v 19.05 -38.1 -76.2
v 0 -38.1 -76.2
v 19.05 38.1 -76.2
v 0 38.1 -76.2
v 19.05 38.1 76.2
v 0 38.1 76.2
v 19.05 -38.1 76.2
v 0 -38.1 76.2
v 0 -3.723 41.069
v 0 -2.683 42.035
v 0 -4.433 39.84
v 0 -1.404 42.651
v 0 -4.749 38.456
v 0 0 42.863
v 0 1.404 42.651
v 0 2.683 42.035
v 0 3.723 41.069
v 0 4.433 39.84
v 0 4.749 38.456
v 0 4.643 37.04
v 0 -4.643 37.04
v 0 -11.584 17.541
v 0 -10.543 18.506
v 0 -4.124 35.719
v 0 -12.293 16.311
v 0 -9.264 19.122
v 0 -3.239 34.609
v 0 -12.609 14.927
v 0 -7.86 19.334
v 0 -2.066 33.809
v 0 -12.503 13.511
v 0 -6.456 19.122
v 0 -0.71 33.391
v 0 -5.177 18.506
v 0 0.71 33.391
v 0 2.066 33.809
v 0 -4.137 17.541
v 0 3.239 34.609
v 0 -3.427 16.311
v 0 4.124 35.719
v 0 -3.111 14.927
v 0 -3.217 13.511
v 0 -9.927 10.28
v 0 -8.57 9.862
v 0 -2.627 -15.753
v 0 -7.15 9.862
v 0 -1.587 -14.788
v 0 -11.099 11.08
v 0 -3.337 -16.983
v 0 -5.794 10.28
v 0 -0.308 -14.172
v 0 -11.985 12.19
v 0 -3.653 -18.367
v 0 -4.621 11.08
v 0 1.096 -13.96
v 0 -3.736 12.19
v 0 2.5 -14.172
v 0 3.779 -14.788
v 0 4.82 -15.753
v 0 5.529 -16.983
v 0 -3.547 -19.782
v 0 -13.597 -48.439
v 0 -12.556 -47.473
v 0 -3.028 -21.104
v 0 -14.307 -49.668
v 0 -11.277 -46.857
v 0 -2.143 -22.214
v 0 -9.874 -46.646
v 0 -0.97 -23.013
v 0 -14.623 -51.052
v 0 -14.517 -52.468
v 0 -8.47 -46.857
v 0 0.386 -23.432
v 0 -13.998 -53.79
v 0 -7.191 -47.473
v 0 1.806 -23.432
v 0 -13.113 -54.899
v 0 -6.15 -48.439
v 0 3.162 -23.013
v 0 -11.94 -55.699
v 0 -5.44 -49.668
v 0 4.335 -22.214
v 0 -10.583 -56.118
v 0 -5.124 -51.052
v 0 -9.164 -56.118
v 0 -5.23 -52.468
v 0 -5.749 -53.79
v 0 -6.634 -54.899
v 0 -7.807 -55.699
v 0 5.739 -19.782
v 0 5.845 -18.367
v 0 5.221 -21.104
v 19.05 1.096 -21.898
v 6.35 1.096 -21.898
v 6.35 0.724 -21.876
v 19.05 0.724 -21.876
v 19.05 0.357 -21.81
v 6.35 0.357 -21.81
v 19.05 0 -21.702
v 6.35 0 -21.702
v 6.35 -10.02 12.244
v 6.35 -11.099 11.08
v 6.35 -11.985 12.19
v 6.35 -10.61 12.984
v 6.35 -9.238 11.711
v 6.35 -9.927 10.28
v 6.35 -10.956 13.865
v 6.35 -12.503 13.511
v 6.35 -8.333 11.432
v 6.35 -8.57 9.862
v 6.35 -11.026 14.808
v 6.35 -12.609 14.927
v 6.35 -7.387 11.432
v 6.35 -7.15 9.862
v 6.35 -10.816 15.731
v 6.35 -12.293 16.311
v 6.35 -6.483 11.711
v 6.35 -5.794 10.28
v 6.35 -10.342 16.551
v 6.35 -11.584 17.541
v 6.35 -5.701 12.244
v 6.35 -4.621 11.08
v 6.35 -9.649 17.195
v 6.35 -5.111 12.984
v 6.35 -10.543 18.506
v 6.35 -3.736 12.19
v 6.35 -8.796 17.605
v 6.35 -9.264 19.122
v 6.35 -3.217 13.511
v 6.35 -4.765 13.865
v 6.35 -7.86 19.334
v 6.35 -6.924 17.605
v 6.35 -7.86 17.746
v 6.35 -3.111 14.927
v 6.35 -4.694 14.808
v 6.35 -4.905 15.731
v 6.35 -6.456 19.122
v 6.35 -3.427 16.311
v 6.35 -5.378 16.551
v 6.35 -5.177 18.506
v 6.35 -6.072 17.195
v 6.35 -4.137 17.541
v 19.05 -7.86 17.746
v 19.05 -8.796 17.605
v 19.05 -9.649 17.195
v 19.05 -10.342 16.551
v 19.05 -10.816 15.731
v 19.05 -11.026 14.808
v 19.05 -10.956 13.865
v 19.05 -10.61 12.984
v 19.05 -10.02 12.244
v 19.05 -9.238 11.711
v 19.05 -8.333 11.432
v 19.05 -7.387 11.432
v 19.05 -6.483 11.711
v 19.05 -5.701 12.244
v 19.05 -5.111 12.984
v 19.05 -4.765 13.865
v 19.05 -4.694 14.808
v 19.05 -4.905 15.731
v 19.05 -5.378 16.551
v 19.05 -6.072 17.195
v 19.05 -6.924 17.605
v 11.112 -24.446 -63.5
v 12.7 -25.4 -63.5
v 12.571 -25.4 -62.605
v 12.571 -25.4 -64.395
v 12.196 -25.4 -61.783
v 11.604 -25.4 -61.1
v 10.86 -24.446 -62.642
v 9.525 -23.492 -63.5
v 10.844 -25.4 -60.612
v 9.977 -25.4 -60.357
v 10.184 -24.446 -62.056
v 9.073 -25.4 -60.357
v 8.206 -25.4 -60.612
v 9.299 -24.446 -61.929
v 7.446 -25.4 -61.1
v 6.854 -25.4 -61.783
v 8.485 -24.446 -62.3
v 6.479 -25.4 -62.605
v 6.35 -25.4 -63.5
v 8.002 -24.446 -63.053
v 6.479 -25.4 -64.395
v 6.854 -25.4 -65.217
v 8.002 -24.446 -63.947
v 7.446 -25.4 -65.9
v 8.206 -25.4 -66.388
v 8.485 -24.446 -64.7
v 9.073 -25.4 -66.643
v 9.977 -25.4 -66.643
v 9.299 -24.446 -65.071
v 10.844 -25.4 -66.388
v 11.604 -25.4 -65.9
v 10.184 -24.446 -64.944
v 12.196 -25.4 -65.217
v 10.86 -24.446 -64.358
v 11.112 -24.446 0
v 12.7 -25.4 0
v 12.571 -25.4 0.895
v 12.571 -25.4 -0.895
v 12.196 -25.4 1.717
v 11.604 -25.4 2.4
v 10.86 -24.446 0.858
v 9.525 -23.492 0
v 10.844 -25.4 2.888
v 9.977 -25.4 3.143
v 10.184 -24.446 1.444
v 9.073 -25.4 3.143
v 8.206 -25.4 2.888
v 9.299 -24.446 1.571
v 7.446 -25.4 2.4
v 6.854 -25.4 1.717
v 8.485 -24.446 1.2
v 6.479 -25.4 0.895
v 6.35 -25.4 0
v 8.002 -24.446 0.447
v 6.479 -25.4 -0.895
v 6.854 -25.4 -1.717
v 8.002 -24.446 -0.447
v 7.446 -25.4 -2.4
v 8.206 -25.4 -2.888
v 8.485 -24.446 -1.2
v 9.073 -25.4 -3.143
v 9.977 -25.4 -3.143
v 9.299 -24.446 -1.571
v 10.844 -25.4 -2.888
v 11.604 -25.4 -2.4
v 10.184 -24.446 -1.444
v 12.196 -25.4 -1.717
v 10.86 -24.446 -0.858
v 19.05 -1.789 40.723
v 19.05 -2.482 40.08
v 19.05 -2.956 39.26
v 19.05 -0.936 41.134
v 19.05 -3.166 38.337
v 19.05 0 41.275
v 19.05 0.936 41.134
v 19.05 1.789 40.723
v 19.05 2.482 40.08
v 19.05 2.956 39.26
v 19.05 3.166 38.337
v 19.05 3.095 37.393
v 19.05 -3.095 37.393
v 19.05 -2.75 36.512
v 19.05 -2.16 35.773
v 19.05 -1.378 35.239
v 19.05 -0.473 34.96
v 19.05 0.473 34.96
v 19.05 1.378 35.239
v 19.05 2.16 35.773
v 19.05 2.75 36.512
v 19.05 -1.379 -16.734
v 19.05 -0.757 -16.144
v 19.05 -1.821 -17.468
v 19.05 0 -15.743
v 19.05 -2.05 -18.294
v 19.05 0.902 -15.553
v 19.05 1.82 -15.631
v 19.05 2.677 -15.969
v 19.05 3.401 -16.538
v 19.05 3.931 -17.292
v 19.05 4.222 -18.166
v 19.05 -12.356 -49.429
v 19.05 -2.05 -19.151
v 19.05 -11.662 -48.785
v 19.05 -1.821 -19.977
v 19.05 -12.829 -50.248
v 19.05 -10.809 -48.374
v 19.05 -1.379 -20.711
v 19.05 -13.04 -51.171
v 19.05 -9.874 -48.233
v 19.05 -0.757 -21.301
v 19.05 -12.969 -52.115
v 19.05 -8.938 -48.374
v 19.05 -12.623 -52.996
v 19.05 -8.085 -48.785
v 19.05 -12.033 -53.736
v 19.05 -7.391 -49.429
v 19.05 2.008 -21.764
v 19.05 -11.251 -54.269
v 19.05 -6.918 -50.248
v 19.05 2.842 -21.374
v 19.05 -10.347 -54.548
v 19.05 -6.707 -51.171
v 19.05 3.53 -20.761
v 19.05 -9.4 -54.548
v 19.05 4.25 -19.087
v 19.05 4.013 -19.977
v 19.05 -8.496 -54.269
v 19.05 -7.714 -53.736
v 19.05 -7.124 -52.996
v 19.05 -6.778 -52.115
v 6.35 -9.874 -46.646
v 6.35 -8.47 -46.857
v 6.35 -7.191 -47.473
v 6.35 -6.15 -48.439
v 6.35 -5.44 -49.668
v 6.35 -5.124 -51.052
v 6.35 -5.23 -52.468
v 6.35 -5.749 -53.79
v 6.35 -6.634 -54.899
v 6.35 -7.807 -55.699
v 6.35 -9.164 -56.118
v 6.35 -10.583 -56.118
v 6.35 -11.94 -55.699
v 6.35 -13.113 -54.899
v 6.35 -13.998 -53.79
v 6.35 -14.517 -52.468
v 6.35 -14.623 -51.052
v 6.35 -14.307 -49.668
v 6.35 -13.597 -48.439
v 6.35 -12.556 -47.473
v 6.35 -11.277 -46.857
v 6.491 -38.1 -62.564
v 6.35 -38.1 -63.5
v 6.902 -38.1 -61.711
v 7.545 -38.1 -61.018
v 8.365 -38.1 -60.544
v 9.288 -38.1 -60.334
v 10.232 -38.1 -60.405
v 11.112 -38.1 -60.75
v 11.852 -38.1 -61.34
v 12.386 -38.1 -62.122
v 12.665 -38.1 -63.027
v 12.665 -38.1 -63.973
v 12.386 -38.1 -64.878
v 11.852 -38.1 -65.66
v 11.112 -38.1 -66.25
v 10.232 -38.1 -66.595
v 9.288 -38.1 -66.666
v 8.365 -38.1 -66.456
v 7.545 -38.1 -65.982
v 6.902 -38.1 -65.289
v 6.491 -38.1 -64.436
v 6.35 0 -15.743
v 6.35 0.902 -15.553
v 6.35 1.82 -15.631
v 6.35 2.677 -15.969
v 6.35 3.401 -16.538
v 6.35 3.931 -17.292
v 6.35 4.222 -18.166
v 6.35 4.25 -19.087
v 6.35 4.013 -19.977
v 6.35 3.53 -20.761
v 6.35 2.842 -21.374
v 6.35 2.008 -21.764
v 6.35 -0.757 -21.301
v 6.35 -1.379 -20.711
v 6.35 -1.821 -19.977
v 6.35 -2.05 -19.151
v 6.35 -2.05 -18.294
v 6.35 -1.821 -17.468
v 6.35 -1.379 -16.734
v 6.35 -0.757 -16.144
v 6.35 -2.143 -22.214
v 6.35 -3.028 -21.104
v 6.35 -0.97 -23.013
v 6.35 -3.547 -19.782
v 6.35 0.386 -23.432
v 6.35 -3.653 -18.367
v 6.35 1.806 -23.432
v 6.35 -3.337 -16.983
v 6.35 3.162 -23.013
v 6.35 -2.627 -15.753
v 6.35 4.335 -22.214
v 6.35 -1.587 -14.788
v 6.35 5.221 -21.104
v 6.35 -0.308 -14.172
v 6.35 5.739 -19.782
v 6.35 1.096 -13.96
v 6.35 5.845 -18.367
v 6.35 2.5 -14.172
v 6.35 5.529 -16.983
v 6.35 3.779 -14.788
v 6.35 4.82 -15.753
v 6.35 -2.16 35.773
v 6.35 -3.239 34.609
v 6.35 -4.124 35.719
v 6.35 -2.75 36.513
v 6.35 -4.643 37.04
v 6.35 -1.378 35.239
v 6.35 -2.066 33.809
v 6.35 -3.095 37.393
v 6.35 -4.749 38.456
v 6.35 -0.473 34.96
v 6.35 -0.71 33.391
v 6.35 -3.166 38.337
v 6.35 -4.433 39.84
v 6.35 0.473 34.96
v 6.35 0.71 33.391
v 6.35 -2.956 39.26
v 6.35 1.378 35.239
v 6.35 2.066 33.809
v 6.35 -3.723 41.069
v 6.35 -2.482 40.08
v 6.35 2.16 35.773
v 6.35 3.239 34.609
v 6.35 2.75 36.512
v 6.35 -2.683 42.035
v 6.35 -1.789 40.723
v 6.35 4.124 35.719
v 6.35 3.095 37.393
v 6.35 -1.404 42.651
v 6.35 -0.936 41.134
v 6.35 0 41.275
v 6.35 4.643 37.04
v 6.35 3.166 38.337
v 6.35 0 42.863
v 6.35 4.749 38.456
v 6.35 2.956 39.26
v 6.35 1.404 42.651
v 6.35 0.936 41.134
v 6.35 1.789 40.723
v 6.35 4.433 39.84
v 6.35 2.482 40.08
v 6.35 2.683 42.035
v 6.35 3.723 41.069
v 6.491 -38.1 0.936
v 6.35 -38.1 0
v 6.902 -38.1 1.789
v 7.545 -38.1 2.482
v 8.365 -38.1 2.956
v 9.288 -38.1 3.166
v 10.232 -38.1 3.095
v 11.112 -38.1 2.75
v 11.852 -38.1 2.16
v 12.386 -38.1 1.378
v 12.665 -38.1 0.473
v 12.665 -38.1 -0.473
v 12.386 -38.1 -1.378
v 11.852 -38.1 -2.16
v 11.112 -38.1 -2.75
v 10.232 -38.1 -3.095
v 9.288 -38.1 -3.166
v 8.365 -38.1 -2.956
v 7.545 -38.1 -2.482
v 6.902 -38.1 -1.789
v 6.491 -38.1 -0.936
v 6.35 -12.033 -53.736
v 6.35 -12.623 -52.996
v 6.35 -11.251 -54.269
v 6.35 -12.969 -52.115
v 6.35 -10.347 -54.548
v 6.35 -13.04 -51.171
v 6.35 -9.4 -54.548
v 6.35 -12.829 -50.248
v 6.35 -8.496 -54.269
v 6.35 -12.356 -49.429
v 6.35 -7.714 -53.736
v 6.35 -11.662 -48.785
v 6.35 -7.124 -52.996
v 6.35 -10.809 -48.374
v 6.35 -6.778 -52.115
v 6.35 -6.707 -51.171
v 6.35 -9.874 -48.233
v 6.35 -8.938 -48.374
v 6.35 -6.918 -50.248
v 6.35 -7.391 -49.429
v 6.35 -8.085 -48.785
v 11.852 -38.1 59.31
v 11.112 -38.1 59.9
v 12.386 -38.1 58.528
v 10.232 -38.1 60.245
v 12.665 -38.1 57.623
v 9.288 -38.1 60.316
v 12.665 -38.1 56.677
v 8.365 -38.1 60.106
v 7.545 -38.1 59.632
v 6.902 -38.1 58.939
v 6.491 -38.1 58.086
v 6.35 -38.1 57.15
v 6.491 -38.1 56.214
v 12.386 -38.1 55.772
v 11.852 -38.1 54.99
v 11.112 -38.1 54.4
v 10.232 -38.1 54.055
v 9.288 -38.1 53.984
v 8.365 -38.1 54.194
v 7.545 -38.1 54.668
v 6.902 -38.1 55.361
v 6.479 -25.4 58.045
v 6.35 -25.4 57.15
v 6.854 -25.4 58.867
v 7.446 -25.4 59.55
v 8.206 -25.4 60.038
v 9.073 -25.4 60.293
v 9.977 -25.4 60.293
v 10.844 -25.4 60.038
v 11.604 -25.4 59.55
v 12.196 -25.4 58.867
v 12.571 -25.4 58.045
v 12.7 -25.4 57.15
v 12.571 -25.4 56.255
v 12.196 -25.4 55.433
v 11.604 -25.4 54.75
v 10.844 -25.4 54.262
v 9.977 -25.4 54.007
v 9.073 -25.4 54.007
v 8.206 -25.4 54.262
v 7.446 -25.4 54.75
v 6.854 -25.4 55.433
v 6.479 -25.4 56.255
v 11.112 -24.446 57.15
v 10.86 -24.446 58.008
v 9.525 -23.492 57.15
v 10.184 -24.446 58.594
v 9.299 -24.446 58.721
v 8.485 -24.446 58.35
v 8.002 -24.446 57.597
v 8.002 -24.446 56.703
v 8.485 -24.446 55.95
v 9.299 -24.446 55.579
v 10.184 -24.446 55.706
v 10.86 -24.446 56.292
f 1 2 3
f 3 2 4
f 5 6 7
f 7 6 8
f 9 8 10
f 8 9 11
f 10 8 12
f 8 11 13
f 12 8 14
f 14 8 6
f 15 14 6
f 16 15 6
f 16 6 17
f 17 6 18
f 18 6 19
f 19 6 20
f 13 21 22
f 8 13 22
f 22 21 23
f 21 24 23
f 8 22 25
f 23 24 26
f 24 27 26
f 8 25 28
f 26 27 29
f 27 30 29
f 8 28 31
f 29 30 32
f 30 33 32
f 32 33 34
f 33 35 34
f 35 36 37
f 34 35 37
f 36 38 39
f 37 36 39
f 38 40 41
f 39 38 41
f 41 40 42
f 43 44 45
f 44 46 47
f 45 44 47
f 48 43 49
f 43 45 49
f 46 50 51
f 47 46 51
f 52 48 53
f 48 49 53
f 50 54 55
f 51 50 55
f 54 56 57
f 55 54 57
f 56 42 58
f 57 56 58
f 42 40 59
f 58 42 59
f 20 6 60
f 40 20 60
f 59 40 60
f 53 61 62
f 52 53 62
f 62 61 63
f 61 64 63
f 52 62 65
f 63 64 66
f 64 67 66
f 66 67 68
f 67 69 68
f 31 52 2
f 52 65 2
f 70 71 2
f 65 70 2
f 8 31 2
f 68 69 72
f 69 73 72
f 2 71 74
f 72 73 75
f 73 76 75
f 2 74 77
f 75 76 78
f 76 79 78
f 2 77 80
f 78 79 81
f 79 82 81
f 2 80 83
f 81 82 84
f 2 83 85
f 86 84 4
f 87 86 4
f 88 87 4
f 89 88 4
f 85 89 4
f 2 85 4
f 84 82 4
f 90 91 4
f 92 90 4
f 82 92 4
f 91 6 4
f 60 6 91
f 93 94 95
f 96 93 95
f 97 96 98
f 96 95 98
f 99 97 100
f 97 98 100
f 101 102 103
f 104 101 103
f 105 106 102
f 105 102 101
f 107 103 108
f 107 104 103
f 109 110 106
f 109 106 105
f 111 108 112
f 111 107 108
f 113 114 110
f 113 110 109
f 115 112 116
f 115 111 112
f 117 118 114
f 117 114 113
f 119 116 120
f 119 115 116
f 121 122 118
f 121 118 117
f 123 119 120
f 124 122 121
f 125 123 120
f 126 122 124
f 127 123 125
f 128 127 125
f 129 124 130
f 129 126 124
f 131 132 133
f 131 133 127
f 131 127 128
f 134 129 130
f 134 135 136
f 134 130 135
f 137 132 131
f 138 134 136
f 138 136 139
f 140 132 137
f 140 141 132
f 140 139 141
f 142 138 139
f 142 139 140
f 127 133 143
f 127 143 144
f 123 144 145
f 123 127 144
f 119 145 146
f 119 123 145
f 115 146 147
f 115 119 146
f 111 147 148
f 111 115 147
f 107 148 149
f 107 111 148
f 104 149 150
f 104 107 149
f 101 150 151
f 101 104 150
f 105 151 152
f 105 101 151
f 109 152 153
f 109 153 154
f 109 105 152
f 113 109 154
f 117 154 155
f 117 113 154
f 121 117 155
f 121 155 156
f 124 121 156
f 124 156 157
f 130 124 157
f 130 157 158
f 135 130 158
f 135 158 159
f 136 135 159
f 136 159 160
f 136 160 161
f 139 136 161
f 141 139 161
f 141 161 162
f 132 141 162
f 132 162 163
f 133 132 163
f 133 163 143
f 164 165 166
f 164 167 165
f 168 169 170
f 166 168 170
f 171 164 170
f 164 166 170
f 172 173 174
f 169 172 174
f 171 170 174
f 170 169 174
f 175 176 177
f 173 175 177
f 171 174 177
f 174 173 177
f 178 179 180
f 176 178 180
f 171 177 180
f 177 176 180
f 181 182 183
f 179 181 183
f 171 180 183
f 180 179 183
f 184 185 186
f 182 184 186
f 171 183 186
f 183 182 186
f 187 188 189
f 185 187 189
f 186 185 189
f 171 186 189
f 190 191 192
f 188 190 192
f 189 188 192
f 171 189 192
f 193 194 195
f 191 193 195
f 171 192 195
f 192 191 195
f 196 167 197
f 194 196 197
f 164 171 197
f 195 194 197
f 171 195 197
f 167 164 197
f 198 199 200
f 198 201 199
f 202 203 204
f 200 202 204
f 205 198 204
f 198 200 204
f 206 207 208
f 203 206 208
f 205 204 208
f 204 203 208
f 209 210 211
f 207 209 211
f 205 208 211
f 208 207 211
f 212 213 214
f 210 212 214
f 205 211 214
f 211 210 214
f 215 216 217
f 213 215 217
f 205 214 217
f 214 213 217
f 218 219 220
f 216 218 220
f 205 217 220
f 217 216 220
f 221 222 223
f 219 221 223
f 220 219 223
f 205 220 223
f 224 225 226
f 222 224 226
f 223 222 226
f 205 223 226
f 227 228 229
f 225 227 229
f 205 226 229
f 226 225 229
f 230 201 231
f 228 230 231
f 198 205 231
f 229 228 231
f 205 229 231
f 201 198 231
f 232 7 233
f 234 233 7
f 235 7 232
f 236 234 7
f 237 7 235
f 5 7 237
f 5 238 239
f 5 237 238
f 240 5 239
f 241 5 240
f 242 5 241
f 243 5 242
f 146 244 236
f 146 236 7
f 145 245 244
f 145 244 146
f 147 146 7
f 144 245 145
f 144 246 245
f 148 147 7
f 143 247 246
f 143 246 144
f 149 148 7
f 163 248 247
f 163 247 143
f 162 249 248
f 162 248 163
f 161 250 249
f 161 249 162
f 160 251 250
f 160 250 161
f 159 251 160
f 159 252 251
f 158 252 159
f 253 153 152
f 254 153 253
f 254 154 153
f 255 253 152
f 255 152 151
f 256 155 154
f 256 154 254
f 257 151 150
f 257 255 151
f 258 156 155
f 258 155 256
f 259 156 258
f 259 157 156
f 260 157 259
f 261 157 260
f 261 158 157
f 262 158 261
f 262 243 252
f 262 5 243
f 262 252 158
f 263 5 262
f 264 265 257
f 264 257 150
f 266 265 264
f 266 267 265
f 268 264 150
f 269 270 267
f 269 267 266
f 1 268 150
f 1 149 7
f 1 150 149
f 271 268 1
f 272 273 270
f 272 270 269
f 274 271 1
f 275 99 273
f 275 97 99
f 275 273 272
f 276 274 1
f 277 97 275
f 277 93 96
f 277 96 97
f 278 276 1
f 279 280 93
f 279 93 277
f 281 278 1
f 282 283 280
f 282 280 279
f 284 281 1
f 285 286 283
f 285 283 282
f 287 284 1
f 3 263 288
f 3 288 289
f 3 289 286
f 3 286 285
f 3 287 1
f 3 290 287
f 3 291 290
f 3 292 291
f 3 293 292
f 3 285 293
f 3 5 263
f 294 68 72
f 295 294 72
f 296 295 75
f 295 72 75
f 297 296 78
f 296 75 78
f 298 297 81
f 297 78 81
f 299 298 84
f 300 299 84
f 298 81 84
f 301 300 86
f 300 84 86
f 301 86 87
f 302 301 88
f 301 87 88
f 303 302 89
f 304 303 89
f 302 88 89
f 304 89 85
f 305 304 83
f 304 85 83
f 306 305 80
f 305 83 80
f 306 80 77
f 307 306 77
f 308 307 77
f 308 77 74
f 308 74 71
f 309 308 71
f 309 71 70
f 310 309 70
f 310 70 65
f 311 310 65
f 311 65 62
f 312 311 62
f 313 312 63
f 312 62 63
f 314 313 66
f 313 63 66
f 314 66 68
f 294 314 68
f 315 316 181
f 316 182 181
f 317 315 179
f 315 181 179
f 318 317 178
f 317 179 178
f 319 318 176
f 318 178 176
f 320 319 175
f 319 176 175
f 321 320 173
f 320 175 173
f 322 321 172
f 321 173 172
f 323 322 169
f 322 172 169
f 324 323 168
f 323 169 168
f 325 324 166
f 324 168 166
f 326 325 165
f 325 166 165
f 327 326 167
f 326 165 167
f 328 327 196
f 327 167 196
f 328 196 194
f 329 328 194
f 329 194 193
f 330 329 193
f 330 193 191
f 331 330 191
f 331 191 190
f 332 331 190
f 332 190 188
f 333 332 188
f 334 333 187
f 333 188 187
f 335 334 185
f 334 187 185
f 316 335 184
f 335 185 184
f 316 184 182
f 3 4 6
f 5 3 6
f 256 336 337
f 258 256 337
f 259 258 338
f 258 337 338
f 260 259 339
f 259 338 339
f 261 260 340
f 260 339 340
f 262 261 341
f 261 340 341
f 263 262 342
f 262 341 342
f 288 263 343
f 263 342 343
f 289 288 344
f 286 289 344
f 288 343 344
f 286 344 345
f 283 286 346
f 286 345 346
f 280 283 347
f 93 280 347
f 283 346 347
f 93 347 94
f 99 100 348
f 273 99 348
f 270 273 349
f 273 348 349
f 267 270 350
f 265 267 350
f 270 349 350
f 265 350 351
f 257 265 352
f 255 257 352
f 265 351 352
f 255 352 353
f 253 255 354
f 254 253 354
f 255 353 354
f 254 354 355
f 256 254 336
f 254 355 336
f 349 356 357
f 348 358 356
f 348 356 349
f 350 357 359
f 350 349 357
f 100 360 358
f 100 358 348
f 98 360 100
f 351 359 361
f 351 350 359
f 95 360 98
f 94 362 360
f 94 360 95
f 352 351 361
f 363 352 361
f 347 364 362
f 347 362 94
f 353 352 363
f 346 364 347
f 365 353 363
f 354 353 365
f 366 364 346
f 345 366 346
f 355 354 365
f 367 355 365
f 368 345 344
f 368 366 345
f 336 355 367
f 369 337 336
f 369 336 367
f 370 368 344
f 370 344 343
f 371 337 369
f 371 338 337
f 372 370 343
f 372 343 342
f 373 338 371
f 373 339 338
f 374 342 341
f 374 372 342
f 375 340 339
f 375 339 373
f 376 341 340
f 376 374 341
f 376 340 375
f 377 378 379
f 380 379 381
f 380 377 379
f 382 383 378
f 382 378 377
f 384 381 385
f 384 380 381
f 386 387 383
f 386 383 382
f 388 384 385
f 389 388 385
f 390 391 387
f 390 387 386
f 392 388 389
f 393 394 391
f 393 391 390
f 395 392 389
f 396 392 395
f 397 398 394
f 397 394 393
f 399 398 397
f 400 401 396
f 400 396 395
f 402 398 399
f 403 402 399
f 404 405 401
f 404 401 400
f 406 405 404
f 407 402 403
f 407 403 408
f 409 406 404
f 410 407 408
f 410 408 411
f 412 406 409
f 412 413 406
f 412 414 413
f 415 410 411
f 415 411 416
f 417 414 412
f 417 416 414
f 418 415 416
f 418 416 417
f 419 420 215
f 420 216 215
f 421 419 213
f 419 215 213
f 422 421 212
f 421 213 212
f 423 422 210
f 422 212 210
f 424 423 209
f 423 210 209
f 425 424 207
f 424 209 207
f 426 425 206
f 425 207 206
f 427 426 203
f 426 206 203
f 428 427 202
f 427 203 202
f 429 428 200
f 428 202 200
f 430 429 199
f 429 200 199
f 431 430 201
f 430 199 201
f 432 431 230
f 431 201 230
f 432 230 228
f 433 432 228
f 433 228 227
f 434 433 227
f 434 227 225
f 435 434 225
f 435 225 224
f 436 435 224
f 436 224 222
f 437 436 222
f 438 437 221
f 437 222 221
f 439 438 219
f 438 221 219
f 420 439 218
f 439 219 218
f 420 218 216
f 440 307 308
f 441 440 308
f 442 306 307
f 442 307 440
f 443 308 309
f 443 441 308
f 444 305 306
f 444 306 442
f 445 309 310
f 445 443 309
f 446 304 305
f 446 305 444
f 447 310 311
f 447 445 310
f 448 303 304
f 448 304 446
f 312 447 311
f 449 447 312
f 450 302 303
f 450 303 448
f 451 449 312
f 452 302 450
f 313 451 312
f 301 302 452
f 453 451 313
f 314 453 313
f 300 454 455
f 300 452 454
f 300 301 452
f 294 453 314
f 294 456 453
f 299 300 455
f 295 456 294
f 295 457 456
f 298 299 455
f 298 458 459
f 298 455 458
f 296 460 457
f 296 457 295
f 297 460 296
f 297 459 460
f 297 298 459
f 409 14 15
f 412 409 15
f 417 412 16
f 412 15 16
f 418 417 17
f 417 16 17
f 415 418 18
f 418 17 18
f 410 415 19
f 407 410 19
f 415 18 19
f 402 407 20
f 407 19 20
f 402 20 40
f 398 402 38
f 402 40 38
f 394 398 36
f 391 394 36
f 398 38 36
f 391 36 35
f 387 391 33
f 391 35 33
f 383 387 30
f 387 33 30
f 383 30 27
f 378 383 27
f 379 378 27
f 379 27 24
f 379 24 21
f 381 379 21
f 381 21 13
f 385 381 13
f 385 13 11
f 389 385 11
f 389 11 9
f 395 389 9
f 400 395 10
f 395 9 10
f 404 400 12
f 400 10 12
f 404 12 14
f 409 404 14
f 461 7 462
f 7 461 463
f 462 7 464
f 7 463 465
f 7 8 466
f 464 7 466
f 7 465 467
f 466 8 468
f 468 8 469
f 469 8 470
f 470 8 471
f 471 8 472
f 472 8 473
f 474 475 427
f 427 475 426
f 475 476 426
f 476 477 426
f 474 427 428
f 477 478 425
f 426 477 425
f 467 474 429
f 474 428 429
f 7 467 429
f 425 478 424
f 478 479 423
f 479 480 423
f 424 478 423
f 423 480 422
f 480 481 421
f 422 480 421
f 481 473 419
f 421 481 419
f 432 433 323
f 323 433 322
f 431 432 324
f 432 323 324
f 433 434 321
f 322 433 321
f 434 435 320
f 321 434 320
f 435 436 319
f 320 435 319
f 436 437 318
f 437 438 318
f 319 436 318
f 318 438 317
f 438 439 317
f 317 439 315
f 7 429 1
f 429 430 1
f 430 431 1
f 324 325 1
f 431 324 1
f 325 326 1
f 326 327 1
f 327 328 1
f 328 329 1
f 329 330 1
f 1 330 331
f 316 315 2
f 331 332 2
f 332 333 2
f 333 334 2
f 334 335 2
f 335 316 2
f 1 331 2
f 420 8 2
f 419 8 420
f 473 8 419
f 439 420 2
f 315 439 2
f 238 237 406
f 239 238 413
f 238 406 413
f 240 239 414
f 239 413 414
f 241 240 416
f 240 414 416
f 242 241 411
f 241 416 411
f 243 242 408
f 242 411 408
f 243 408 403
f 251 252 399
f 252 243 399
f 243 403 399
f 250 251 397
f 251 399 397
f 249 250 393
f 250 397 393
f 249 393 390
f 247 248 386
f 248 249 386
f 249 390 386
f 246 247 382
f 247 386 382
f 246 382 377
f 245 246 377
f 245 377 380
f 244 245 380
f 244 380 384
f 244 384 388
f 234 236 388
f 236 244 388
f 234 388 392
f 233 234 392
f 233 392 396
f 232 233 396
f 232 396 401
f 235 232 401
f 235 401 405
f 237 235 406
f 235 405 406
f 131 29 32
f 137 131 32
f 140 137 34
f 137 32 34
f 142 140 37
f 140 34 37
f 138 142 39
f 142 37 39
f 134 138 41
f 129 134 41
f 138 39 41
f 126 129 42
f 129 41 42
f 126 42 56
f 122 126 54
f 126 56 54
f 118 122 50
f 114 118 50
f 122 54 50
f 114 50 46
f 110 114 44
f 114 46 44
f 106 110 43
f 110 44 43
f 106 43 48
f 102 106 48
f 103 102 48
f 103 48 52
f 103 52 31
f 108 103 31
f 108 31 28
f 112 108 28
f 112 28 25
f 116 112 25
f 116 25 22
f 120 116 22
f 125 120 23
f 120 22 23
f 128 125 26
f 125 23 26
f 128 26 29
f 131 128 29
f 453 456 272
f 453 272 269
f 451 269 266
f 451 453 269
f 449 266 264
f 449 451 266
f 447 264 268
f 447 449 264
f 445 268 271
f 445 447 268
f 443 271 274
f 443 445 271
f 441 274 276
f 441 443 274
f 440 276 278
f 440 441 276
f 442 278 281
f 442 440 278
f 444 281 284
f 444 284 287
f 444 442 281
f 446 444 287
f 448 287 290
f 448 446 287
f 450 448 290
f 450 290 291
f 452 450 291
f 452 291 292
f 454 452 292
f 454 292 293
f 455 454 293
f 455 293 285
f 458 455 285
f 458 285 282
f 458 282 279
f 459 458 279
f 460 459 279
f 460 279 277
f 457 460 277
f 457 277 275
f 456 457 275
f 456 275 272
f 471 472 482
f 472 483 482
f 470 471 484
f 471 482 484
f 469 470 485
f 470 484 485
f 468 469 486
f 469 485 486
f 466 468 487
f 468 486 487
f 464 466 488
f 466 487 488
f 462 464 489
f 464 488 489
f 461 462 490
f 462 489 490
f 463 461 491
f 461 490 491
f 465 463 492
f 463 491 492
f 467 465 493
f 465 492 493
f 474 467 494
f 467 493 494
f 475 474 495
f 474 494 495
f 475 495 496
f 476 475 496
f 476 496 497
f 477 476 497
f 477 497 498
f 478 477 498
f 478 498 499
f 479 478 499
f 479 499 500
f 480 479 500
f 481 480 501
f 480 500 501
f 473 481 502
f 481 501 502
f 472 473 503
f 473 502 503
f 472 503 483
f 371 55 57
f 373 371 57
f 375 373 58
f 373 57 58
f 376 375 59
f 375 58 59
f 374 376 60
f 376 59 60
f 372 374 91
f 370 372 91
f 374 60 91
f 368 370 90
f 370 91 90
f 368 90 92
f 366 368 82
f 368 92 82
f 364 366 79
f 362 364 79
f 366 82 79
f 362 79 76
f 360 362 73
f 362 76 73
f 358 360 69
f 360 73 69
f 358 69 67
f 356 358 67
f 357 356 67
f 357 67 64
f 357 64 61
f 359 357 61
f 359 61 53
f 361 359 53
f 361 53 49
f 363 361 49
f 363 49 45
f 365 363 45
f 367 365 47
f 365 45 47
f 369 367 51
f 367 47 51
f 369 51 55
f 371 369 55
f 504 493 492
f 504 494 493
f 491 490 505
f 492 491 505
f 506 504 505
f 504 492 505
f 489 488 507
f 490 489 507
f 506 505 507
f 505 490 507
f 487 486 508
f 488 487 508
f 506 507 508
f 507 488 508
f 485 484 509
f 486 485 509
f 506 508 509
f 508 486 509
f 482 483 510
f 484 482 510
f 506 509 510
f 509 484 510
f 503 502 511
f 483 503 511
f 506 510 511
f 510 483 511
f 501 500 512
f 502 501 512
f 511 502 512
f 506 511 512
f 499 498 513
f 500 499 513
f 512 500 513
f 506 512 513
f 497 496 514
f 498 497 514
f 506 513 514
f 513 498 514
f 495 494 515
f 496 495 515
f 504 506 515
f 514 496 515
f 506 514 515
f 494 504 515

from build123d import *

# Parameters (mm, degrees)
SKETCH1_W                       = 152.4
SKETCH1_H                       = 76.2
SKETCH1_R                       = 3.175
BOSS_EXTRUDE1_DEPTH             = 19.05
SKETCH2_R                       = 4.7625
CUT_EXTRUDE1_DEPTH              = 6.35
F_1_4_0_25_DIAMETER_HOLE1_D     = 6.35
F_1_4_0_25_DIAMETER_HOLE1_DEPTH = 12.7
F_1_4_0_25_DIAMETER_HOLE1_TIP   = 1.907732465


with BuildPart() as part:
    # Sketch1 → Boss-Extrude1 (new body)
    with BuildSketch(Plane(origin=(0, 0, 0), x_dir=(0, 0, -1), z_dir=(1, 0, 0))):
        Rectangle(SKETCH1_W, SKETCH1_H)
        with Locations((18.72253158, 1.096077429)):
            Circle(SKETCH1_R, mode=Mode.SUBTRACT)
        with Locations((-38.1, 0)):
            Circle(SKETCH1_R, mode=Mode.SUBTRACT)
        with Locations((-14.571224015, -7.860160654)):
            Circle(SKETCH1_R, mode=Mode.SUBTRACT)
        with Locations((51.408255992, -9.873506971)):
            Circle(SKETCH1_R, mode=Mode.SUBTRACT)
    extrude(amount=BOSS_EXTRUDE1_DEPTH)

    # Sketch2 → Cut-Extrude1 (cut)
    with BuildSketch(Plane.ZY):
        with Locations((38.1, 0)):
            Circle(SKETCH2_R)
        with Locations((14.571224015, -7.860160654)):
            Circle(SKETCH2_R)
        with Locations((-18.72253158, 1.096077429)):
            Circle(SKETCH2_R)
        with Locations((-51.408255992, -9.873506971)):
            Circle(SKETCH2_R)
    extrude(amount=-CUT_EXTRUDE1_DEPTH, mode=Mode.SUBTRACT)

    # 1/4 (0.25) Diameter Hole1
    with Locations(Plane.XZ.offset(38.1)):
        with Locations((9.525, -63.5), (9.525, 0), (9.525, 57.15)):
            Hole(F_1_4_0_25_DIAMETER_HOLE1_D / 2, depth=F_1_4_0_25_DIAMETER_HOLE1_DEPTH)
            with Locations((0, 0, -(F_1_4_0_25_DIAMETER_HOLE1_DEPTH + F_1_4_0_25_DIAMETER_HOLE1_TIP / 2))):  # 118° drill point
                Cone(0, F_1_4_0_25_DIAMETER_HOLE1_D / 2, F_1_4_0_25_DIAMETER_HOLE1_TIP, mode=Mode.SUBTRACT)


solid = part.part
